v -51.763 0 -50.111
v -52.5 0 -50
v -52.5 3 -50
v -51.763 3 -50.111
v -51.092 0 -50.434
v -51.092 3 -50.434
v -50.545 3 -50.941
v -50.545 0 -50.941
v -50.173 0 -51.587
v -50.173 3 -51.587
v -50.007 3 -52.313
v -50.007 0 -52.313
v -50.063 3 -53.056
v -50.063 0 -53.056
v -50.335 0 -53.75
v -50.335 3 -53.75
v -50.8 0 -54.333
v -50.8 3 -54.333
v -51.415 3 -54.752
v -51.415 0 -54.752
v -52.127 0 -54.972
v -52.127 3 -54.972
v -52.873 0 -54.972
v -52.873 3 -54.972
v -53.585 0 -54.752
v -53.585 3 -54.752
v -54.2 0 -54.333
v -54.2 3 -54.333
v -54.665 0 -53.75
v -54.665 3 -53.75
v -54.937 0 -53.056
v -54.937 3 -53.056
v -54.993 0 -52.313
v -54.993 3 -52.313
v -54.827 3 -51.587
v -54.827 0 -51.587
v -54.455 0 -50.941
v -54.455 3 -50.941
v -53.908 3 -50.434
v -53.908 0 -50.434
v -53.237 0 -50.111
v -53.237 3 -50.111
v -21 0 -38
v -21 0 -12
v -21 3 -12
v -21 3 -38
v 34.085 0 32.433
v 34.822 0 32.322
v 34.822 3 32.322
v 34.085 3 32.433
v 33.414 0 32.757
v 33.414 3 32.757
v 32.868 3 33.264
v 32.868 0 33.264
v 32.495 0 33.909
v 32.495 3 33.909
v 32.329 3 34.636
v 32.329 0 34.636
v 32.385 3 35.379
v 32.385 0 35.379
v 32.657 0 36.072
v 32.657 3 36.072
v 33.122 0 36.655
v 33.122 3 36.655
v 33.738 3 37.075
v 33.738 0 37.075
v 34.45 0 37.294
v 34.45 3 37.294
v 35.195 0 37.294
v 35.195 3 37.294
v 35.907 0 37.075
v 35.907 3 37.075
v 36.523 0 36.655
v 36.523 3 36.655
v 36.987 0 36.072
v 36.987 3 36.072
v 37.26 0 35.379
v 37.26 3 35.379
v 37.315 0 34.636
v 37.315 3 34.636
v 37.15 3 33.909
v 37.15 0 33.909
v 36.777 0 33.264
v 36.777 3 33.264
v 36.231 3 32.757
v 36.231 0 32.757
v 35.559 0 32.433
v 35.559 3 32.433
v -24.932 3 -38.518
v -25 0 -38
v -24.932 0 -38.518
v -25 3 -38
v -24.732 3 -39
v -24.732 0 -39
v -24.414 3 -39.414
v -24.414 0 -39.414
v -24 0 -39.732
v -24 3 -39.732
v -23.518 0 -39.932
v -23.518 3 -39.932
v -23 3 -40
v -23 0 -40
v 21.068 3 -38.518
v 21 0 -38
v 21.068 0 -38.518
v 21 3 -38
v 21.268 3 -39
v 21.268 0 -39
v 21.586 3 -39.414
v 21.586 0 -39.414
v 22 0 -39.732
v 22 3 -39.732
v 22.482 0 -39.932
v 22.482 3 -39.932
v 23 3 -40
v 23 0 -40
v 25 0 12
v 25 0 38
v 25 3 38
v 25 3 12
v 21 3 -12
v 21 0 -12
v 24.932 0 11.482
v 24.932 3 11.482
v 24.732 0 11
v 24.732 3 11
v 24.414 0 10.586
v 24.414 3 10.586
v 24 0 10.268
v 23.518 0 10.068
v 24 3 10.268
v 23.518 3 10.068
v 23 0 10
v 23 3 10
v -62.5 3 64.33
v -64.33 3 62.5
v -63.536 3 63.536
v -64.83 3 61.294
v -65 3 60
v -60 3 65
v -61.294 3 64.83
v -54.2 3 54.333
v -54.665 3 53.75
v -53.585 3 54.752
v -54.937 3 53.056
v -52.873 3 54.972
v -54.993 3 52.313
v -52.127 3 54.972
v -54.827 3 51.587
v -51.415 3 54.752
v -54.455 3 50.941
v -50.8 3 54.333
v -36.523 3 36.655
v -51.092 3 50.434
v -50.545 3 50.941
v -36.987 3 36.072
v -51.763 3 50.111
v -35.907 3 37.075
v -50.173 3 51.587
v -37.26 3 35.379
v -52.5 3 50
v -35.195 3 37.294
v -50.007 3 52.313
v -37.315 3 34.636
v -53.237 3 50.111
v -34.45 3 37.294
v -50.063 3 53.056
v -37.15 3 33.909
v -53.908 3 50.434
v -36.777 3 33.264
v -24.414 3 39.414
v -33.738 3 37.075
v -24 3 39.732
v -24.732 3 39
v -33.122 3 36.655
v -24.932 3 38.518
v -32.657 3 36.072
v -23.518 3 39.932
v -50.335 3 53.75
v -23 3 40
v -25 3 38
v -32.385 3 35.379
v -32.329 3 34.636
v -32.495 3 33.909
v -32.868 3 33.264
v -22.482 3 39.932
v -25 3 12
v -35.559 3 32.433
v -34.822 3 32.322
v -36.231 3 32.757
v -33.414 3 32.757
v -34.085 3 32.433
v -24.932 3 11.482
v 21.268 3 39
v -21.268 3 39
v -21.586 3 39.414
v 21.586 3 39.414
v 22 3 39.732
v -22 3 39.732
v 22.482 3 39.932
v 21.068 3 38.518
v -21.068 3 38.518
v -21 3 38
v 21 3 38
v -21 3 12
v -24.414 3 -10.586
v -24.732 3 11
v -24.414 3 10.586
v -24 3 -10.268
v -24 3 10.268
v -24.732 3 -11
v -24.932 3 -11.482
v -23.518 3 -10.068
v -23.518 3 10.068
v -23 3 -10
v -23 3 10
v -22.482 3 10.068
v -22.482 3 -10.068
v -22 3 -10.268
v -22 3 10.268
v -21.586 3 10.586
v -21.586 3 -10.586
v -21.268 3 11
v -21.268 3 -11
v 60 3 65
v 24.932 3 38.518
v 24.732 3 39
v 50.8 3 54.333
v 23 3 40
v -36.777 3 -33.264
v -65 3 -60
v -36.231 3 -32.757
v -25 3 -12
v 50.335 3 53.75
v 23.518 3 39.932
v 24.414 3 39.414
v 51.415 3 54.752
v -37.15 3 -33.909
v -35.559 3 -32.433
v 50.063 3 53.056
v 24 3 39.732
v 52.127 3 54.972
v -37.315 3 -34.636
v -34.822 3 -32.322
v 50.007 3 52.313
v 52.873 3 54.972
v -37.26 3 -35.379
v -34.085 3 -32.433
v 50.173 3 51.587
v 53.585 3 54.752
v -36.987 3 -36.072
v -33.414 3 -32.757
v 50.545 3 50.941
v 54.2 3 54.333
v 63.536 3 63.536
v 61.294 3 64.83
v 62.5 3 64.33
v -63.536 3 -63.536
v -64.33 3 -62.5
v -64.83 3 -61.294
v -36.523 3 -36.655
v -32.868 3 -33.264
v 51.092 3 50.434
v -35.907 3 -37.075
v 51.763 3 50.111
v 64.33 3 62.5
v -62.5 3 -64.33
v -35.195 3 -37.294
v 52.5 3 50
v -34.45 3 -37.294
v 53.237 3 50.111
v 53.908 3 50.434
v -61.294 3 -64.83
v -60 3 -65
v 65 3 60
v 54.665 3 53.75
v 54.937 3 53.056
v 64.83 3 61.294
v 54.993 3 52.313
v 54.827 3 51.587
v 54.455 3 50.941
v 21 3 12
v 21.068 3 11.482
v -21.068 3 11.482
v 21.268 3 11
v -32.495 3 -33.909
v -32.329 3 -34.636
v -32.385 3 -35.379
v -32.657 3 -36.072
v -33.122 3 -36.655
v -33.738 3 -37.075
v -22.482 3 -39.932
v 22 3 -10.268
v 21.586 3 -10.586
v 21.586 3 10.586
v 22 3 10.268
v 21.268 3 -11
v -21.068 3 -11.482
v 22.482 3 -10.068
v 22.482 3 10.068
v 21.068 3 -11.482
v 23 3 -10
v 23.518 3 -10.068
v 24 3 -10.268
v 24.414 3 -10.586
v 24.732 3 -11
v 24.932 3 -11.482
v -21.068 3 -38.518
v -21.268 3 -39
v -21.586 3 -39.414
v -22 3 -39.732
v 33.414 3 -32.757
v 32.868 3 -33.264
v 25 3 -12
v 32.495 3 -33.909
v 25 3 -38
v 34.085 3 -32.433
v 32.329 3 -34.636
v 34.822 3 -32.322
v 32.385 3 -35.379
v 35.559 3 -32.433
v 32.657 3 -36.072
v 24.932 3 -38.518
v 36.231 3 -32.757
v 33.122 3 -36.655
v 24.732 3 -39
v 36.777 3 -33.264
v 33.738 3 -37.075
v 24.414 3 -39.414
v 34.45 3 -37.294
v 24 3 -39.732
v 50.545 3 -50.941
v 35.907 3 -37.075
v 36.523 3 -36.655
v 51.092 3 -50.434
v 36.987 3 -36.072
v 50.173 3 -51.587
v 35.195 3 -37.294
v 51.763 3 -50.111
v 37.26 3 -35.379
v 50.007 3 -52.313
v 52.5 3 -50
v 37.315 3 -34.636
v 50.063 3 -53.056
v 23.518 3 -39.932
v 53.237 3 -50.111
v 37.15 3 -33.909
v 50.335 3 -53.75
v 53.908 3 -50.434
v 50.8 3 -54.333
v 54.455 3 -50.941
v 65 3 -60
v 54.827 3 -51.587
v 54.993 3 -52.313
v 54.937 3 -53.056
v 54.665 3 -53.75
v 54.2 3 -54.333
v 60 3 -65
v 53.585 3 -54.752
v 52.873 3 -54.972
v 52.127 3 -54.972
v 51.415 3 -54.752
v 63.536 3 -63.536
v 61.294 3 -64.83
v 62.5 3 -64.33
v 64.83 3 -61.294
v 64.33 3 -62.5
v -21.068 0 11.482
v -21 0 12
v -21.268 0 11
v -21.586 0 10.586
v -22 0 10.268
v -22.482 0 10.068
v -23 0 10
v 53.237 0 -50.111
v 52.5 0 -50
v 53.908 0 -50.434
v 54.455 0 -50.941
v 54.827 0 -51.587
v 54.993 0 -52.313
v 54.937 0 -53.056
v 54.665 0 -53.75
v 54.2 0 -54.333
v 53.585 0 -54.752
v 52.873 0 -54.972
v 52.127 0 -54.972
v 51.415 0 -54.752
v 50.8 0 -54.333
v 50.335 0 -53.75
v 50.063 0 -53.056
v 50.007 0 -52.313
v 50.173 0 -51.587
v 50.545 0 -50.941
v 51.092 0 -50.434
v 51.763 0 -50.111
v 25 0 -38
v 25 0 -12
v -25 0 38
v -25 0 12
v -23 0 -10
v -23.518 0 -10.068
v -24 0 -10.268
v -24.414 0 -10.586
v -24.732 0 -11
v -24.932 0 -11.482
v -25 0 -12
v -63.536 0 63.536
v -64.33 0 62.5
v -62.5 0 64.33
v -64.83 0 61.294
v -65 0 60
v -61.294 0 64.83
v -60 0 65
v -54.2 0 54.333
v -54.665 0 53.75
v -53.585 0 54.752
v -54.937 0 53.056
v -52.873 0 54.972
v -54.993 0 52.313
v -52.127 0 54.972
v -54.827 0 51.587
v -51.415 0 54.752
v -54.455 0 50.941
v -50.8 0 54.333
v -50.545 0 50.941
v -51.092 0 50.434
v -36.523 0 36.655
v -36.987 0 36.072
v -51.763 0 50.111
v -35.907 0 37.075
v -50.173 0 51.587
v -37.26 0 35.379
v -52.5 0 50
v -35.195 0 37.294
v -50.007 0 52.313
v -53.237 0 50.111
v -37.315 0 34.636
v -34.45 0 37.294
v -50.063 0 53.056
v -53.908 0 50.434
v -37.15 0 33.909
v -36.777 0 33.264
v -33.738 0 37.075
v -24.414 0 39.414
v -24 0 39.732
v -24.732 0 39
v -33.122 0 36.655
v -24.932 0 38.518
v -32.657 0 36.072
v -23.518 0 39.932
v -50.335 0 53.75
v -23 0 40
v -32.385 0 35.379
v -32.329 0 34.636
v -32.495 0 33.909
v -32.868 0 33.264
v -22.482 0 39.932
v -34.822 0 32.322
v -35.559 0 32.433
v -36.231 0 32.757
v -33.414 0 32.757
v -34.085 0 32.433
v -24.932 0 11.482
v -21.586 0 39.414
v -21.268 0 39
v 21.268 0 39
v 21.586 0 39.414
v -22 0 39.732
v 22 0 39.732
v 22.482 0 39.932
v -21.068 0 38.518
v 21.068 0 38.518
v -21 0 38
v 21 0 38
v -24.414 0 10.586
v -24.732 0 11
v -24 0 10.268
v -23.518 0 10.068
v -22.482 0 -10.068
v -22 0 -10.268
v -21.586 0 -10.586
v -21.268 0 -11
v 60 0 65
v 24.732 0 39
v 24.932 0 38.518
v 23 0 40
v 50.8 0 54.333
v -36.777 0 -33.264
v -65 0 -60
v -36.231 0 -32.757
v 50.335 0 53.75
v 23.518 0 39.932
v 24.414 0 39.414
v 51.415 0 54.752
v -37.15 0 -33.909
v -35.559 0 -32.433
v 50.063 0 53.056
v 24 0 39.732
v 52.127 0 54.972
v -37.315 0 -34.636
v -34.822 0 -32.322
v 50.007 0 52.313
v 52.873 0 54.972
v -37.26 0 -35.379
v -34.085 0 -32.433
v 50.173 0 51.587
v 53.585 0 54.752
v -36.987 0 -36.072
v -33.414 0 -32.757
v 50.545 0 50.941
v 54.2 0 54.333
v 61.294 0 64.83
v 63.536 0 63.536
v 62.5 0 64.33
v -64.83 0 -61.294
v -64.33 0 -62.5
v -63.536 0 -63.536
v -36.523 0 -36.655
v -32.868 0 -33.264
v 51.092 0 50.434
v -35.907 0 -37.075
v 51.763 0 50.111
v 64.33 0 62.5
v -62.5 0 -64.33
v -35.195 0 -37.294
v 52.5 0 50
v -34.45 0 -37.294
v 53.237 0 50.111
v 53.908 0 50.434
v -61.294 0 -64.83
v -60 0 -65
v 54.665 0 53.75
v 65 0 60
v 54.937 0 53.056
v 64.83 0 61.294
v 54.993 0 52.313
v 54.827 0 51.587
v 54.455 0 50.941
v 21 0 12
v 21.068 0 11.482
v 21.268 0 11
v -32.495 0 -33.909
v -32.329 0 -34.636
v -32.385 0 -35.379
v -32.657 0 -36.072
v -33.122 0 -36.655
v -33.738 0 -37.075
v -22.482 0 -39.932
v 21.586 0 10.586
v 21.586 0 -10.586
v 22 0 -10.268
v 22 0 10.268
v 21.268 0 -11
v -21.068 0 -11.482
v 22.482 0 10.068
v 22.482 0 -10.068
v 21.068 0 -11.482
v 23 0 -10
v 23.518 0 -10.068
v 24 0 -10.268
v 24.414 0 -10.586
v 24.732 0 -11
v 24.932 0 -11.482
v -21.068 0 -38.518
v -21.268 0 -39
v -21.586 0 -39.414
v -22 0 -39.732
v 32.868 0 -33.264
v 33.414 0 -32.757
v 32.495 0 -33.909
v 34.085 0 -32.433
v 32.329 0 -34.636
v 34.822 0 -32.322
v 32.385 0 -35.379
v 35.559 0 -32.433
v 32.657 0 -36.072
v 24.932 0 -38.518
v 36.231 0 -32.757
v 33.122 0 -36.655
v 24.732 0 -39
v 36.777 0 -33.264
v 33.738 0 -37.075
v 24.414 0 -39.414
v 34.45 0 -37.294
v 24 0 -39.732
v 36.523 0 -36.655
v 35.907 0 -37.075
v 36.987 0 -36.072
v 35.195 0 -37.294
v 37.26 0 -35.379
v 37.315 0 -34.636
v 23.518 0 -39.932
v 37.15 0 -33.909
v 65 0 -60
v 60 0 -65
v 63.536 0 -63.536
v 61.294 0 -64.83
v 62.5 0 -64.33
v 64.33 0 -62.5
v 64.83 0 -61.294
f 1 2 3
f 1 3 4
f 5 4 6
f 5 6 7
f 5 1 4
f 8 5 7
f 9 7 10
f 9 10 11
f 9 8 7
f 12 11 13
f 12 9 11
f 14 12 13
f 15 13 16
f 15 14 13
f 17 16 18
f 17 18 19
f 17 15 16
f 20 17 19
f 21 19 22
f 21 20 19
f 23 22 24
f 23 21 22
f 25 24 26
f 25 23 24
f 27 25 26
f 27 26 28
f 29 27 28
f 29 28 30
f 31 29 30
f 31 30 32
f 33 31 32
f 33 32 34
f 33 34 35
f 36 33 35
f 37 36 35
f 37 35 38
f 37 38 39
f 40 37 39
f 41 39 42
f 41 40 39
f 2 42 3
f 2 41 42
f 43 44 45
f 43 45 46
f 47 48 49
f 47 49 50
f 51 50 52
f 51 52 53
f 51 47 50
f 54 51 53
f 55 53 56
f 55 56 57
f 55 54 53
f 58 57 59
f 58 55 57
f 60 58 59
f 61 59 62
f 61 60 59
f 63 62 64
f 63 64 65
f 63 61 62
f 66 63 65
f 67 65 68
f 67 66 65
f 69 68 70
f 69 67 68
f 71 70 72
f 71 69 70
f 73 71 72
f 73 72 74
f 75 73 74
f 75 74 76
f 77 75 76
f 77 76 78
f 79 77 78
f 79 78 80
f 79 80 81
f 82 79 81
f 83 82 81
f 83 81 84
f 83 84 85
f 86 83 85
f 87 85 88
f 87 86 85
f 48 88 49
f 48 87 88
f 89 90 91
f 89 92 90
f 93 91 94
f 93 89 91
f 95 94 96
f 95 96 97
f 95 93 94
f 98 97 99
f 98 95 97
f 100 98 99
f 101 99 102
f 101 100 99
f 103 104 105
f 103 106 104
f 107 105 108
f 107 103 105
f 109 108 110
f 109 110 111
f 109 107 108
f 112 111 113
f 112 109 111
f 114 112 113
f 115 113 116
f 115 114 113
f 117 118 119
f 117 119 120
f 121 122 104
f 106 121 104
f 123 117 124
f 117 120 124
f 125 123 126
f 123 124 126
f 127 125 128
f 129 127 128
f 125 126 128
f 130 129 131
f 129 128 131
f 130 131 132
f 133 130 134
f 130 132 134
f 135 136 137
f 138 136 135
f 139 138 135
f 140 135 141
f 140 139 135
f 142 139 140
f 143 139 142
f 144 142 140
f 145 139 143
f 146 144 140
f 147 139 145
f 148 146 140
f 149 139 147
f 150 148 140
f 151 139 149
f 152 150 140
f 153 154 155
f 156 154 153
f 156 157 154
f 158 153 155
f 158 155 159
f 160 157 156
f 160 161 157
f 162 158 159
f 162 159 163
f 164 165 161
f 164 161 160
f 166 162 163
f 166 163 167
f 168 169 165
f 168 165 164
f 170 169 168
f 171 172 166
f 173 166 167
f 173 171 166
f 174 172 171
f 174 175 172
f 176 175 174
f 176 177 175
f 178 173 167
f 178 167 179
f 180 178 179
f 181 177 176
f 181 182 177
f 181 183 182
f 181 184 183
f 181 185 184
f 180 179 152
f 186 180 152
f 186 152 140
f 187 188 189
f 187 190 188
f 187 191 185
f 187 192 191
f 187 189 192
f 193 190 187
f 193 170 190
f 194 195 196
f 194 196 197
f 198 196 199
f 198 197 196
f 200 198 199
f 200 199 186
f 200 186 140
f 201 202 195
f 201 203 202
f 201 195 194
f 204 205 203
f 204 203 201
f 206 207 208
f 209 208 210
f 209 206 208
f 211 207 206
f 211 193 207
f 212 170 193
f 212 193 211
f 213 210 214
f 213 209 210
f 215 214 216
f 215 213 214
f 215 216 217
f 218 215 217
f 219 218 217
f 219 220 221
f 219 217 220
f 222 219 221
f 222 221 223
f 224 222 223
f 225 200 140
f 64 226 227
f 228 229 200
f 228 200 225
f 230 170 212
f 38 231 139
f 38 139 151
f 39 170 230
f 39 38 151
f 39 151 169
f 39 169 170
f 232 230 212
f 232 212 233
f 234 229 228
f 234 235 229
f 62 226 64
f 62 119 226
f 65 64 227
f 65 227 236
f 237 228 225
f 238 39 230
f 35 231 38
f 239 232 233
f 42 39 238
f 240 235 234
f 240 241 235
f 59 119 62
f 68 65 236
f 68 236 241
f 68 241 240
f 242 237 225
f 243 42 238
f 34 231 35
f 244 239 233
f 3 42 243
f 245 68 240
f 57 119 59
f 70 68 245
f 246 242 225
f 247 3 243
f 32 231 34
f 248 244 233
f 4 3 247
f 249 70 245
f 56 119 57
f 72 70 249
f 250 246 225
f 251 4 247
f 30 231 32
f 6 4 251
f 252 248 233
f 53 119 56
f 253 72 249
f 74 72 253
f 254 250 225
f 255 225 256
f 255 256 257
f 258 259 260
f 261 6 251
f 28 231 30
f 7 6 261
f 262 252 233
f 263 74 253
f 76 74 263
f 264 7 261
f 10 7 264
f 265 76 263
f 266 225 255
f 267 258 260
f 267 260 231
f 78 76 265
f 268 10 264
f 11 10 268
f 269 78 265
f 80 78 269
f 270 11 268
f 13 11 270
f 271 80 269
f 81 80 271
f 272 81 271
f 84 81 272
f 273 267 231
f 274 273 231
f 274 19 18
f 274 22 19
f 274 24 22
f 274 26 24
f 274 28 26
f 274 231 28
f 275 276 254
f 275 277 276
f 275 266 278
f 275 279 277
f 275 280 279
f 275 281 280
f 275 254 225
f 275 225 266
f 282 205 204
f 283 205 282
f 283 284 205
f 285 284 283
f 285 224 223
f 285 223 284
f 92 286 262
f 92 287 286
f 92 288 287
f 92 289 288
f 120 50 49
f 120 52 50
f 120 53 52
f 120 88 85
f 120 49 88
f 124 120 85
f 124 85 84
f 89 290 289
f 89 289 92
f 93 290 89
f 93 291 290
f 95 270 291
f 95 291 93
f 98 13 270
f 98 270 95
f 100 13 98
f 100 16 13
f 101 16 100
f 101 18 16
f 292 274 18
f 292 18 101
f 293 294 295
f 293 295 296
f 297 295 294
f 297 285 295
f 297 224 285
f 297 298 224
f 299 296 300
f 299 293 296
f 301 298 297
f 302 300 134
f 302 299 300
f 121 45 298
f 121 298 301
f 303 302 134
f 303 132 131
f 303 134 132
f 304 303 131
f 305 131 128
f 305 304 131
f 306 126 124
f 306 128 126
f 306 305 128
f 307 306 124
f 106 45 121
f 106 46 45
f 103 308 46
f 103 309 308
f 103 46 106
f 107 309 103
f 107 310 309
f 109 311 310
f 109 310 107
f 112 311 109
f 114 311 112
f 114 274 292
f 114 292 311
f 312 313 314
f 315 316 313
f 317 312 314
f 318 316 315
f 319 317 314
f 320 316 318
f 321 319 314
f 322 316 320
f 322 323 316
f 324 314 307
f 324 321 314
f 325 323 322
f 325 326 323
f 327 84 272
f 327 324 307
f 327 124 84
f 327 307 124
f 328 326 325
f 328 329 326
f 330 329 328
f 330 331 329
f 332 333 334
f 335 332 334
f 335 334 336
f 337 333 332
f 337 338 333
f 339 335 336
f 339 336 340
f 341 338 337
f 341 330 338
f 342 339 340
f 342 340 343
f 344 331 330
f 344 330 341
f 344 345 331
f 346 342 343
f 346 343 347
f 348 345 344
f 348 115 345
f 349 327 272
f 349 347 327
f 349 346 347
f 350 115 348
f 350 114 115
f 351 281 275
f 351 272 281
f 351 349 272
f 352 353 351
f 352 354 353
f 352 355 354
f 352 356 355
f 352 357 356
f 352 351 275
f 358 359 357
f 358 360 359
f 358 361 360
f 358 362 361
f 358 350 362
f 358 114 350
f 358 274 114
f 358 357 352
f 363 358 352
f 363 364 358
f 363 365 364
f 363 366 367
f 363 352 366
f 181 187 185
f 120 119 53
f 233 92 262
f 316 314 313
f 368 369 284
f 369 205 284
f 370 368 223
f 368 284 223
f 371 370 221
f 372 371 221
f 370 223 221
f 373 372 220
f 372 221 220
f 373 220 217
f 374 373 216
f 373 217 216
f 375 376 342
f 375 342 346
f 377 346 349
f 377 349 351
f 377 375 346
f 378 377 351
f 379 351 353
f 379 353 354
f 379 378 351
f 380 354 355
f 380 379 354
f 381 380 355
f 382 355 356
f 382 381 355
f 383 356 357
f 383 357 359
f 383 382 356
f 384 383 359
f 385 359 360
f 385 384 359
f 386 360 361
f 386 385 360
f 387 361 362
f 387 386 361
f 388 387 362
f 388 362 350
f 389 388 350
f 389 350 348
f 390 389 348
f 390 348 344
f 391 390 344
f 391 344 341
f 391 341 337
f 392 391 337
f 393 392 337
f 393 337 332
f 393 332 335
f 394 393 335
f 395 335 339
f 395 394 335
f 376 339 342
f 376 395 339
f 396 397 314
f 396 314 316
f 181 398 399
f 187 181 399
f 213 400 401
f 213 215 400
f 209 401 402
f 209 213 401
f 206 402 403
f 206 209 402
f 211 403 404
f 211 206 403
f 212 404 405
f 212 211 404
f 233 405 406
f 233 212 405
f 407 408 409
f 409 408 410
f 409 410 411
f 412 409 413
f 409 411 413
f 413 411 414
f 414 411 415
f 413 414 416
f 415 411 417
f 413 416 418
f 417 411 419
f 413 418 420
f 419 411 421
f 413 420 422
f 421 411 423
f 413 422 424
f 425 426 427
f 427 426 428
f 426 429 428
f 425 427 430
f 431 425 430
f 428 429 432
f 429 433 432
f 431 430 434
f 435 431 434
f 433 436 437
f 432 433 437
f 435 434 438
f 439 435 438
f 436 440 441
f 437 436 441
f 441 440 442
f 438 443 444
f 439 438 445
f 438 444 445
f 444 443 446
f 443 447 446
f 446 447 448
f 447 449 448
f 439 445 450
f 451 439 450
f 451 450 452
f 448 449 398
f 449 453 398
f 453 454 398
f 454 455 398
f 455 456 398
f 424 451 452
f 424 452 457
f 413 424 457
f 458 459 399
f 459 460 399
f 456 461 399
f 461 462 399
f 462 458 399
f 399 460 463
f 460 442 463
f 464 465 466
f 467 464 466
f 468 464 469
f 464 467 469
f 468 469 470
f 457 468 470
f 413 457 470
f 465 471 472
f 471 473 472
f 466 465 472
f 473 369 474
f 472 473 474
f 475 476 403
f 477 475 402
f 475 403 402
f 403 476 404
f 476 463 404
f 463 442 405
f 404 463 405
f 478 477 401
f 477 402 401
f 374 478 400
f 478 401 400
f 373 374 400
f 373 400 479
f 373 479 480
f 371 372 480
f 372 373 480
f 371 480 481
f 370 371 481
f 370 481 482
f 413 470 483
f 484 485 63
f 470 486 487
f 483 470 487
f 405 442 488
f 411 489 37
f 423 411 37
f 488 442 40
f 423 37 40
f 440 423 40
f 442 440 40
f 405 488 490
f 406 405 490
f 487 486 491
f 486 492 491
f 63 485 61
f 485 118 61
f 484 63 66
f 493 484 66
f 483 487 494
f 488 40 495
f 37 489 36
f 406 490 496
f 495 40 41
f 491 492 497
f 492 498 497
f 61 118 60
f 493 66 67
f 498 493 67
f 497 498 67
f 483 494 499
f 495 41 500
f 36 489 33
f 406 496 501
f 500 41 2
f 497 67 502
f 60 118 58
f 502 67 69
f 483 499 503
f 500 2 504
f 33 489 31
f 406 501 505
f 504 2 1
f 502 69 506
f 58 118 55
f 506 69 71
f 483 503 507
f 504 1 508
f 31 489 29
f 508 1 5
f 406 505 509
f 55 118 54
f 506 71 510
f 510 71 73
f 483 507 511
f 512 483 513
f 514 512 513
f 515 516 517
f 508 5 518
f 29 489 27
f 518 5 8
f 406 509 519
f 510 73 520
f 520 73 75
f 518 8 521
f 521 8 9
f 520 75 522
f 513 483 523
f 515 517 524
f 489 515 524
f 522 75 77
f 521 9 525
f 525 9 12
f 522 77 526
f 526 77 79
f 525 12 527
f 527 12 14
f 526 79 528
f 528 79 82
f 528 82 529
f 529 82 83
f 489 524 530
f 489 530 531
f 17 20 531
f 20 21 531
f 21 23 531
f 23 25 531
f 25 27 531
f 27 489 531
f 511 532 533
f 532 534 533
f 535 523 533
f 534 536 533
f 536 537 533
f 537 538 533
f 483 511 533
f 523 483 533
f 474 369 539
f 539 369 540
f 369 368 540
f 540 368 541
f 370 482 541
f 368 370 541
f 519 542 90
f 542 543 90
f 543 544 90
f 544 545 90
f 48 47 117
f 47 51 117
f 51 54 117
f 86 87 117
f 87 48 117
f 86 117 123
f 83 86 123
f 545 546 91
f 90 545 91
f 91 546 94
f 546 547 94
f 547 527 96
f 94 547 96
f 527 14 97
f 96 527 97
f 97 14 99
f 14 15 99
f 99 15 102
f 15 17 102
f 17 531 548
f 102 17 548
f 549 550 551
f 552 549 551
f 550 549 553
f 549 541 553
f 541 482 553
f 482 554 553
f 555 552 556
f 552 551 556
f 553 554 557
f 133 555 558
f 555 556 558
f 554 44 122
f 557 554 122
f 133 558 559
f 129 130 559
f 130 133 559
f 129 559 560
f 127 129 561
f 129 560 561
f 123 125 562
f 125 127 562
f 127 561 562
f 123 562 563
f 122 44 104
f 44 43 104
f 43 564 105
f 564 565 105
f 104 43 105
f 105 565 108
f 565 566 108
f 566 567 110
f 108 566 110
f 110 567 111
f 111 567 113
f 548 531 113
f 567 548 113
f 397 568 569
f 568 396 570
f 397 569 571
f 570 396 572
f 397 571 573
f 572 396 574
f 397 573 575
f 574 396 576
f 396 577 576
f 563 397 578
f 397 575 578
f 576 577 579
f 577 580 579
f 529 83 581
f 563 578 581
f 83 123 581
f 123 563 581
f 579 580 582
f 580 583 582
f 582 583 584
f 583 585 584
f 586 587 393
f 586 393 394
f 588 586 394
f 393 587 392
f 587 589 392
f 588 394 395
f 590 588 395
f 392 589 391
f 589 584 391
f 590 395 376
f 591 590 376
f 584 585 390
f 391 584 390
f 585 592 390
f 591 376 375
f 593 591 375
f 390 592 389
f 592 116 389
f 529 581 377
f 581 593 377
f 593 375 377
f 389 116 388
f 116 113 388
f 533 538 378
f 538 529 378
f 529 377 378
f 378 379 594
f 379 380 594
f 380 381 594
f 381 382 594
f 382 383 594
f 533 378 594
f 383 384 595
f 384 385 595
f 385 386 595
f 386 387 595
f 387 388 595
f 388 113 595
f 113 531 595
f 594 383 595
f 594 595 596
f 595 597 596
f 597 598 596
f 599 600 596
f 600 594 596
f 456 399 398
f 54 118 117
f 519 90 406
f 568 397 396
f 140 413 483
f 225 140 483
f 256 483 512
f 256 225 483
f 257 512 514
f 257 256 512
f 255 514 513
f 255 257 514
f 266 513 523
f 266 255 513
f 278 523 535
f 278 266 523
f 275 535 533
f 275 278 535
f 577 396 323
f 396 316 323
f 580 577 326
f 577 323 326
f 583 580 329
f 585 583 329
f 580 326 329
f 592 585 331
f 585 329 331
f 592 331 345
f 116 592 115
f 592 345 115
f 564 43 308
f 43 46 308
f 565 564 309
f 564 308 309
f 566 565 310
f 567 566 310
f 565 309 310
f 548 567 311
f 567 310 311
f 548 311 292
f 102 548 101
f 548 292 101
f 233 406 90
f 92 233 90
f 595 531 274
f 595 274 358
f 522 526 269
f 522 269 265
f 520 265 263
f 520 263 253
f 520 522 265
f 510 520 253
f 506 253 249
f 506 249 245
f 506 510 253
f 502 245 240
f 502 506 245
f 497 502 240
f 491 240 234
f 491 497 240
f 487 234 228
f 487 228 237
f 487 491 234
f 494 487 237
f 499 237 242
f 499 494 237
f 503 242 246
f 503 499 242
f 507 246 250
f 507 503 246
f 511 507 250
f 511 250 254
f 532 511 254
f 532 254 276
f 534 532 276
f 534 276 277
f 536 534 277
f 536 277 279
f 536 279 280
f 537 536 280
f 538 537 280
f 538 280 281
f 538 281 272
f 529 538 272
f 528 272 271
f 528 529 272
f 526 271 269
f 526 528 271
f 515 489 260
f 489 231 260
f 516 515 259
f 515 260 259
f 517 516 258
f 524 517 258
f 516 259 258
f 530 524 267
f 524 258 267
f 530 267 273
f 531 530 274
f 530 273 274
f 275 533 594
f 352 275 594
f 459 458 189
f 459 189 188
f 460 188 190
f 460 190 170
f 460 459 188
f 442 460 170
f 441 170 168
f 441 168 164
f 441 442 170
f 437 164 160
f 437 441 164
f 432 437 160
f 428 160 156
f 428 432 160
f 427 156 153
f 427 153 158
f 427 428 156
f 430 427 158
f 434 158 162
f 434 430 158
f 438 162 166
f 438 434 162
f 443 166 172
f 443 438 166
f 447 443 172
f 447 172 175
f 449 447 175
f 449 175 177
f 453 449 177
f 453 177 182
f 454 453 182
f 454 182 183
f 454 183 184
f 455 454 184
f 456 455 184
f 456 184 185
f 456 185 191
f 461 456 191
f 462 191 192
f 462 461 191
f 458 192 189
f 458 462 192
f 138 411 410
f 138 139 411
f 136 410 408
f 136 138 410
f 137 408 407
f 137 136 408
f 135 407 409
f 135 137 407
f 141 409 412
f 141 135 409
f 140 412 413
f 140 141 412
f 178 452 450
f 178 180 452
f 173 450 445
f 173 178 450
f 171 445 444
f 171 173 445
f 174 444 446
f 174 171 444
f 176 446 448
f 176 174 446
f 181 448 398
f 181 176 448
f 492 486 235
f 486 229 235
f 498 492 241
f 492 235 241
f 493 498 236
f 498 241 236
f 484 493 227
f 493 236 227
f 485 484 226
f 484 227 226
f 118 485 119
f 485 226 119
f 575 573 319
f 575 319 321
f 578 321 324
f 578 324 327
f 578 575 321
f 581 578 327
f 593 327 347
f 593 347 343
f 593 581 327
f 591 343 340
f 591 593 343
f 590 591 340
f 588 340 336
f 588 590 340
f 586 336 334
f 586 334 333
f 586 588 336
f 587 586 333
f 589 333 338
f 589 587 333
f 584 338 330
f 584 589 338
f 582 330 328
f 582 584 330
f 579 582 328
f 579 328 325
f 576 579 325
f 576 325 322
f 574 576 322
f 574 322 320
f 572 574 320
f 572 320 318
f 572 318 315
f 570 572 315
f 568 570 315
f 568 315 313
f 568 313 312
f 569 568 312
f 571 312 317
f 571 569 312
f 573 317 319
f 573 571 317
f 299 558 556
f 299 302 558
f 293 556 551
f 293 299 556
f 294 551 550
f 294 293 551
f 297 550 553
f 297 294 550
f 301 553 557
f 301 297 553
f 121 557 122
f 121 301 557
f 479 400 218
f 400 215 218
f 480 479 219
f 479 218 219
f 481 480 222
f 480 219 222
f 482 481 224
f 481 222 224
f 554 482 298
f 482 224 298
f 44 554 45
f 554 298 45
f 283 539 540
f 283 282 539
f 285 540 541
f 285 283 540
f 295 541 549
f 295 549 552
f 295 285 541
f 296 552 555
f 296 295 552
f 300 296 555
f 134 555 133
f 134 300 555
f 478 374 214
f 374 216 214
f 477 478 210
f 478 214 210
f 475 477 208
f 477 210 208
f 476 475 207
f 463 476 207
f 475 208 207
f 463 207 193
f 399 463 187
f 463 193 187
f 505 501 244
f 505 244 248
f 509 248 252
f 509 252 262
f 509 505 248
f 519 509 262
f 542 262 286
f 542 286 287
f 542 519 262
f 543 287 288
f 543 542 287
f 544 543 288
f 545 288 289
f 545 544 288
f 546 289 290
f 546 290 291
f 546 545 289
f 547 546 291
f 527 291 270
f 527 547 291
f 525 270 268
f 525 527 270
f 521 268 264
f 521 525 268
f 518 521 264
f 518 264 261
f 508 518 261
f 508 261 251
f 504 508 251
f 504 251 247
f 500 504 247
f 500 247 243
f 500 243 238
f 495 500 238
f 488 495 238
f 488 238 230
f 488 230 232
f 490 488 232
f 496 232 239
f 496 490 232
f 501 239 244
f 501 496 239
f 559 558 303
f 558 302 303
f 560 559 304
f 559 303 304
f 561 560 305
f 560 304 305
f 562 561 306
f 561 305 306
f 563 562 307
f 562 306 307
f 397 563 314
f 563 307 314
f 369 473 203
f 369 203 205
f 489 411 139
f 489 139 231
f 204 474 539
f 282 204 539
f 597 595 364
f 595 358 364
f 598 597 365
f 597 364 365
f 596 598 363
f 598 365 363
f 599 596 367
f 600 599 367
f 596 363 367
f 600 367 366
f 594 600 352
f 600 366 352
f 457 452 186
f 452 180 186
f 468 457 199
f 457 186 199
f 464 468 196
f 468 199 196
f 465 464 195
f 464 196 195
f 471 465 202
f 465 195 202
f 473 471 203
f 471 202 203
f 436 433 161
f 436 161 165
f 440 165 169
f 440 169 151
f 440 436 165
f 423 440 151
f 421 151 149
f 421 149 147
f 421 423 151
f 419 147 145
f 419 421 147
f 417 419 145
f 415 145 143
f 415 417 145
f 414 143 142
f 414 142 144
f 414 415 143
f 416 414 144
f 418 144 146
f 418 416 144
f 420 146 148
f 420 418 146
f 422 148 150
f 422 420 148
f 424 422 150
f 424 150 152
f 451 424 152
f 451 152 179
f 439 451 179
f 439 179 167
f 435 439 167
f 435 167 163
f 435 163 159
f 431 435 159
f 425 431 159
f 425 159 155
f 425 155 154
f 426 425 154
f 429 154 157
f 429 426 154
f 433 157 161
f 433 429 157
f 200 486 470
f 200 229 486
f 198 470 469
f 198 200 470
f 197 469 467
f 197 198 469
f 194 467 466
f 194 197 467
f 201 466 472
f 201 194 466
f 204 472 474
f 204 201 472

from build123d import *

# Parameters (mm, degrees)
SKETCH1_W           = 130
SKETCH1_H           = 130
SKETCH1_R           = 2.5
SKETCH1_W_2         = 4
SKETCH1_H_2         = 30
BOSS_EXTRUDE1_DEPTH = 3
FILLET1_R           = 5
FILLET2_R           = 2


with BuildPart() as part:
    # Sketch1 → Boss-Extrude1 (new body)
    with BuildSketch(Plane(origin=(0, 0, 0), x_dir=(1, 0, 0), z_dir=(0, 1, 0))):
        Rectangle(SKETCH1_W, SKETCH1_H)
        with Locations(Location((-52.5, 52.5, 0), (0, 0, 270))):
            Circle(SKETCH1_R, mode=Mode.SUBTRACT)
        with Locations(Location((-34.82233047, 34.82233047, 0), (0, 0, 270))):
            Circle(SKETCH1_R, mode=Mode.SUBTRACT)
        with Locations(Location((52.5, 52.5, 0), (0, 0, 270))):
            Circle(SKETCH1_R, mode=Mode.SUBTRACT)
        with Locations(Location((34.82233047, 34.82233047, 0), (0, 0, 270))):
            Circle(SKETCH1_R, mode=Mode.SUBTRACT)
        with Locations(Location((52.5, -52.5, 0), (0, 0, 90))):
            Circle(SKETCH1_R, mode=Mode.SUBTRACT)
        with Locations(Location((34.82233047, -34.82233047, 0), (0, 0, 90))):
            Circle(SKETCH1_R, mode=Mode.SUBTRACT)
        with Locations(Location((-34.82233047, -34.82233047, 0), (0, 0, 90))):
            Circle(SKETCH1_R, mode=Mode.SUBTRACT)
        with Locations(Location((-52.5, -52.5, 0), (0, 0, 90))):
            Circle(SKETCH1_R, mode=Mode.SUBTRACT)
        with Locations((-23, 25)):
            Rectangle(SKETCH1_W_2, SKETCH1_H_2, mode=Mode.SUBTRACT)
        with Locations((23, 25)):
            Rectangle(SKETCH1_W_2, SKETCH1_H_2, mode=Mode.SUBTRACT)
        with Locations((23, -25)):
            Rectangle(SKETCH1_W_2, SKETCH1_H_2, mode=Mode.SUBTRACT)
        with Locations((-23, -25)):
            Rectangle(SKETCH1_W_2, SKETCH1_H_2, mode=Mode.SUBTRACT)
    extrude(amount=BOSS_EXTRUDE1_DEPTH)

    # Fillet1
    fillet1_edges = [part.edges().sort_by_distance(p)[0] for p in [
        (65, 1.5, 65),
        (-65, 1.5, 65),
        (-65, 1.5, -65),
        (65, 1.5, -65),
    ]]
    fillet(fillet1_edges, radius=FILLET1_R)

    # Fillet2
    fillet2_edges = [part.edges().sort_by_distance(p)[0] for p in [
        (-25, 1.5, 40),
        (-21, 1.5, 40),
        (-25, 1.5, 10),
        (-21, 1.5, 10),
        (-21, 1.5, -10),
        (-25, 1.5, -10),
        (-25, 1.5, -40),
        (-21, 1.5, -40),
        (25, 1.5, -40),
        (21, 1.5, -40),
        (21, 1.5, -10),
        (25, 1.5, -10),
        (21, 1.5, 10),
        (25, 1.5, 10),
        (21, 1.5, 40),
        (25, 1.5, 40),
    ]]
    fillet(fillet2_edges, radius=FILLET2_R - 0.0001)  # a hair under: the kernel refuses the full size


solid = part.part
